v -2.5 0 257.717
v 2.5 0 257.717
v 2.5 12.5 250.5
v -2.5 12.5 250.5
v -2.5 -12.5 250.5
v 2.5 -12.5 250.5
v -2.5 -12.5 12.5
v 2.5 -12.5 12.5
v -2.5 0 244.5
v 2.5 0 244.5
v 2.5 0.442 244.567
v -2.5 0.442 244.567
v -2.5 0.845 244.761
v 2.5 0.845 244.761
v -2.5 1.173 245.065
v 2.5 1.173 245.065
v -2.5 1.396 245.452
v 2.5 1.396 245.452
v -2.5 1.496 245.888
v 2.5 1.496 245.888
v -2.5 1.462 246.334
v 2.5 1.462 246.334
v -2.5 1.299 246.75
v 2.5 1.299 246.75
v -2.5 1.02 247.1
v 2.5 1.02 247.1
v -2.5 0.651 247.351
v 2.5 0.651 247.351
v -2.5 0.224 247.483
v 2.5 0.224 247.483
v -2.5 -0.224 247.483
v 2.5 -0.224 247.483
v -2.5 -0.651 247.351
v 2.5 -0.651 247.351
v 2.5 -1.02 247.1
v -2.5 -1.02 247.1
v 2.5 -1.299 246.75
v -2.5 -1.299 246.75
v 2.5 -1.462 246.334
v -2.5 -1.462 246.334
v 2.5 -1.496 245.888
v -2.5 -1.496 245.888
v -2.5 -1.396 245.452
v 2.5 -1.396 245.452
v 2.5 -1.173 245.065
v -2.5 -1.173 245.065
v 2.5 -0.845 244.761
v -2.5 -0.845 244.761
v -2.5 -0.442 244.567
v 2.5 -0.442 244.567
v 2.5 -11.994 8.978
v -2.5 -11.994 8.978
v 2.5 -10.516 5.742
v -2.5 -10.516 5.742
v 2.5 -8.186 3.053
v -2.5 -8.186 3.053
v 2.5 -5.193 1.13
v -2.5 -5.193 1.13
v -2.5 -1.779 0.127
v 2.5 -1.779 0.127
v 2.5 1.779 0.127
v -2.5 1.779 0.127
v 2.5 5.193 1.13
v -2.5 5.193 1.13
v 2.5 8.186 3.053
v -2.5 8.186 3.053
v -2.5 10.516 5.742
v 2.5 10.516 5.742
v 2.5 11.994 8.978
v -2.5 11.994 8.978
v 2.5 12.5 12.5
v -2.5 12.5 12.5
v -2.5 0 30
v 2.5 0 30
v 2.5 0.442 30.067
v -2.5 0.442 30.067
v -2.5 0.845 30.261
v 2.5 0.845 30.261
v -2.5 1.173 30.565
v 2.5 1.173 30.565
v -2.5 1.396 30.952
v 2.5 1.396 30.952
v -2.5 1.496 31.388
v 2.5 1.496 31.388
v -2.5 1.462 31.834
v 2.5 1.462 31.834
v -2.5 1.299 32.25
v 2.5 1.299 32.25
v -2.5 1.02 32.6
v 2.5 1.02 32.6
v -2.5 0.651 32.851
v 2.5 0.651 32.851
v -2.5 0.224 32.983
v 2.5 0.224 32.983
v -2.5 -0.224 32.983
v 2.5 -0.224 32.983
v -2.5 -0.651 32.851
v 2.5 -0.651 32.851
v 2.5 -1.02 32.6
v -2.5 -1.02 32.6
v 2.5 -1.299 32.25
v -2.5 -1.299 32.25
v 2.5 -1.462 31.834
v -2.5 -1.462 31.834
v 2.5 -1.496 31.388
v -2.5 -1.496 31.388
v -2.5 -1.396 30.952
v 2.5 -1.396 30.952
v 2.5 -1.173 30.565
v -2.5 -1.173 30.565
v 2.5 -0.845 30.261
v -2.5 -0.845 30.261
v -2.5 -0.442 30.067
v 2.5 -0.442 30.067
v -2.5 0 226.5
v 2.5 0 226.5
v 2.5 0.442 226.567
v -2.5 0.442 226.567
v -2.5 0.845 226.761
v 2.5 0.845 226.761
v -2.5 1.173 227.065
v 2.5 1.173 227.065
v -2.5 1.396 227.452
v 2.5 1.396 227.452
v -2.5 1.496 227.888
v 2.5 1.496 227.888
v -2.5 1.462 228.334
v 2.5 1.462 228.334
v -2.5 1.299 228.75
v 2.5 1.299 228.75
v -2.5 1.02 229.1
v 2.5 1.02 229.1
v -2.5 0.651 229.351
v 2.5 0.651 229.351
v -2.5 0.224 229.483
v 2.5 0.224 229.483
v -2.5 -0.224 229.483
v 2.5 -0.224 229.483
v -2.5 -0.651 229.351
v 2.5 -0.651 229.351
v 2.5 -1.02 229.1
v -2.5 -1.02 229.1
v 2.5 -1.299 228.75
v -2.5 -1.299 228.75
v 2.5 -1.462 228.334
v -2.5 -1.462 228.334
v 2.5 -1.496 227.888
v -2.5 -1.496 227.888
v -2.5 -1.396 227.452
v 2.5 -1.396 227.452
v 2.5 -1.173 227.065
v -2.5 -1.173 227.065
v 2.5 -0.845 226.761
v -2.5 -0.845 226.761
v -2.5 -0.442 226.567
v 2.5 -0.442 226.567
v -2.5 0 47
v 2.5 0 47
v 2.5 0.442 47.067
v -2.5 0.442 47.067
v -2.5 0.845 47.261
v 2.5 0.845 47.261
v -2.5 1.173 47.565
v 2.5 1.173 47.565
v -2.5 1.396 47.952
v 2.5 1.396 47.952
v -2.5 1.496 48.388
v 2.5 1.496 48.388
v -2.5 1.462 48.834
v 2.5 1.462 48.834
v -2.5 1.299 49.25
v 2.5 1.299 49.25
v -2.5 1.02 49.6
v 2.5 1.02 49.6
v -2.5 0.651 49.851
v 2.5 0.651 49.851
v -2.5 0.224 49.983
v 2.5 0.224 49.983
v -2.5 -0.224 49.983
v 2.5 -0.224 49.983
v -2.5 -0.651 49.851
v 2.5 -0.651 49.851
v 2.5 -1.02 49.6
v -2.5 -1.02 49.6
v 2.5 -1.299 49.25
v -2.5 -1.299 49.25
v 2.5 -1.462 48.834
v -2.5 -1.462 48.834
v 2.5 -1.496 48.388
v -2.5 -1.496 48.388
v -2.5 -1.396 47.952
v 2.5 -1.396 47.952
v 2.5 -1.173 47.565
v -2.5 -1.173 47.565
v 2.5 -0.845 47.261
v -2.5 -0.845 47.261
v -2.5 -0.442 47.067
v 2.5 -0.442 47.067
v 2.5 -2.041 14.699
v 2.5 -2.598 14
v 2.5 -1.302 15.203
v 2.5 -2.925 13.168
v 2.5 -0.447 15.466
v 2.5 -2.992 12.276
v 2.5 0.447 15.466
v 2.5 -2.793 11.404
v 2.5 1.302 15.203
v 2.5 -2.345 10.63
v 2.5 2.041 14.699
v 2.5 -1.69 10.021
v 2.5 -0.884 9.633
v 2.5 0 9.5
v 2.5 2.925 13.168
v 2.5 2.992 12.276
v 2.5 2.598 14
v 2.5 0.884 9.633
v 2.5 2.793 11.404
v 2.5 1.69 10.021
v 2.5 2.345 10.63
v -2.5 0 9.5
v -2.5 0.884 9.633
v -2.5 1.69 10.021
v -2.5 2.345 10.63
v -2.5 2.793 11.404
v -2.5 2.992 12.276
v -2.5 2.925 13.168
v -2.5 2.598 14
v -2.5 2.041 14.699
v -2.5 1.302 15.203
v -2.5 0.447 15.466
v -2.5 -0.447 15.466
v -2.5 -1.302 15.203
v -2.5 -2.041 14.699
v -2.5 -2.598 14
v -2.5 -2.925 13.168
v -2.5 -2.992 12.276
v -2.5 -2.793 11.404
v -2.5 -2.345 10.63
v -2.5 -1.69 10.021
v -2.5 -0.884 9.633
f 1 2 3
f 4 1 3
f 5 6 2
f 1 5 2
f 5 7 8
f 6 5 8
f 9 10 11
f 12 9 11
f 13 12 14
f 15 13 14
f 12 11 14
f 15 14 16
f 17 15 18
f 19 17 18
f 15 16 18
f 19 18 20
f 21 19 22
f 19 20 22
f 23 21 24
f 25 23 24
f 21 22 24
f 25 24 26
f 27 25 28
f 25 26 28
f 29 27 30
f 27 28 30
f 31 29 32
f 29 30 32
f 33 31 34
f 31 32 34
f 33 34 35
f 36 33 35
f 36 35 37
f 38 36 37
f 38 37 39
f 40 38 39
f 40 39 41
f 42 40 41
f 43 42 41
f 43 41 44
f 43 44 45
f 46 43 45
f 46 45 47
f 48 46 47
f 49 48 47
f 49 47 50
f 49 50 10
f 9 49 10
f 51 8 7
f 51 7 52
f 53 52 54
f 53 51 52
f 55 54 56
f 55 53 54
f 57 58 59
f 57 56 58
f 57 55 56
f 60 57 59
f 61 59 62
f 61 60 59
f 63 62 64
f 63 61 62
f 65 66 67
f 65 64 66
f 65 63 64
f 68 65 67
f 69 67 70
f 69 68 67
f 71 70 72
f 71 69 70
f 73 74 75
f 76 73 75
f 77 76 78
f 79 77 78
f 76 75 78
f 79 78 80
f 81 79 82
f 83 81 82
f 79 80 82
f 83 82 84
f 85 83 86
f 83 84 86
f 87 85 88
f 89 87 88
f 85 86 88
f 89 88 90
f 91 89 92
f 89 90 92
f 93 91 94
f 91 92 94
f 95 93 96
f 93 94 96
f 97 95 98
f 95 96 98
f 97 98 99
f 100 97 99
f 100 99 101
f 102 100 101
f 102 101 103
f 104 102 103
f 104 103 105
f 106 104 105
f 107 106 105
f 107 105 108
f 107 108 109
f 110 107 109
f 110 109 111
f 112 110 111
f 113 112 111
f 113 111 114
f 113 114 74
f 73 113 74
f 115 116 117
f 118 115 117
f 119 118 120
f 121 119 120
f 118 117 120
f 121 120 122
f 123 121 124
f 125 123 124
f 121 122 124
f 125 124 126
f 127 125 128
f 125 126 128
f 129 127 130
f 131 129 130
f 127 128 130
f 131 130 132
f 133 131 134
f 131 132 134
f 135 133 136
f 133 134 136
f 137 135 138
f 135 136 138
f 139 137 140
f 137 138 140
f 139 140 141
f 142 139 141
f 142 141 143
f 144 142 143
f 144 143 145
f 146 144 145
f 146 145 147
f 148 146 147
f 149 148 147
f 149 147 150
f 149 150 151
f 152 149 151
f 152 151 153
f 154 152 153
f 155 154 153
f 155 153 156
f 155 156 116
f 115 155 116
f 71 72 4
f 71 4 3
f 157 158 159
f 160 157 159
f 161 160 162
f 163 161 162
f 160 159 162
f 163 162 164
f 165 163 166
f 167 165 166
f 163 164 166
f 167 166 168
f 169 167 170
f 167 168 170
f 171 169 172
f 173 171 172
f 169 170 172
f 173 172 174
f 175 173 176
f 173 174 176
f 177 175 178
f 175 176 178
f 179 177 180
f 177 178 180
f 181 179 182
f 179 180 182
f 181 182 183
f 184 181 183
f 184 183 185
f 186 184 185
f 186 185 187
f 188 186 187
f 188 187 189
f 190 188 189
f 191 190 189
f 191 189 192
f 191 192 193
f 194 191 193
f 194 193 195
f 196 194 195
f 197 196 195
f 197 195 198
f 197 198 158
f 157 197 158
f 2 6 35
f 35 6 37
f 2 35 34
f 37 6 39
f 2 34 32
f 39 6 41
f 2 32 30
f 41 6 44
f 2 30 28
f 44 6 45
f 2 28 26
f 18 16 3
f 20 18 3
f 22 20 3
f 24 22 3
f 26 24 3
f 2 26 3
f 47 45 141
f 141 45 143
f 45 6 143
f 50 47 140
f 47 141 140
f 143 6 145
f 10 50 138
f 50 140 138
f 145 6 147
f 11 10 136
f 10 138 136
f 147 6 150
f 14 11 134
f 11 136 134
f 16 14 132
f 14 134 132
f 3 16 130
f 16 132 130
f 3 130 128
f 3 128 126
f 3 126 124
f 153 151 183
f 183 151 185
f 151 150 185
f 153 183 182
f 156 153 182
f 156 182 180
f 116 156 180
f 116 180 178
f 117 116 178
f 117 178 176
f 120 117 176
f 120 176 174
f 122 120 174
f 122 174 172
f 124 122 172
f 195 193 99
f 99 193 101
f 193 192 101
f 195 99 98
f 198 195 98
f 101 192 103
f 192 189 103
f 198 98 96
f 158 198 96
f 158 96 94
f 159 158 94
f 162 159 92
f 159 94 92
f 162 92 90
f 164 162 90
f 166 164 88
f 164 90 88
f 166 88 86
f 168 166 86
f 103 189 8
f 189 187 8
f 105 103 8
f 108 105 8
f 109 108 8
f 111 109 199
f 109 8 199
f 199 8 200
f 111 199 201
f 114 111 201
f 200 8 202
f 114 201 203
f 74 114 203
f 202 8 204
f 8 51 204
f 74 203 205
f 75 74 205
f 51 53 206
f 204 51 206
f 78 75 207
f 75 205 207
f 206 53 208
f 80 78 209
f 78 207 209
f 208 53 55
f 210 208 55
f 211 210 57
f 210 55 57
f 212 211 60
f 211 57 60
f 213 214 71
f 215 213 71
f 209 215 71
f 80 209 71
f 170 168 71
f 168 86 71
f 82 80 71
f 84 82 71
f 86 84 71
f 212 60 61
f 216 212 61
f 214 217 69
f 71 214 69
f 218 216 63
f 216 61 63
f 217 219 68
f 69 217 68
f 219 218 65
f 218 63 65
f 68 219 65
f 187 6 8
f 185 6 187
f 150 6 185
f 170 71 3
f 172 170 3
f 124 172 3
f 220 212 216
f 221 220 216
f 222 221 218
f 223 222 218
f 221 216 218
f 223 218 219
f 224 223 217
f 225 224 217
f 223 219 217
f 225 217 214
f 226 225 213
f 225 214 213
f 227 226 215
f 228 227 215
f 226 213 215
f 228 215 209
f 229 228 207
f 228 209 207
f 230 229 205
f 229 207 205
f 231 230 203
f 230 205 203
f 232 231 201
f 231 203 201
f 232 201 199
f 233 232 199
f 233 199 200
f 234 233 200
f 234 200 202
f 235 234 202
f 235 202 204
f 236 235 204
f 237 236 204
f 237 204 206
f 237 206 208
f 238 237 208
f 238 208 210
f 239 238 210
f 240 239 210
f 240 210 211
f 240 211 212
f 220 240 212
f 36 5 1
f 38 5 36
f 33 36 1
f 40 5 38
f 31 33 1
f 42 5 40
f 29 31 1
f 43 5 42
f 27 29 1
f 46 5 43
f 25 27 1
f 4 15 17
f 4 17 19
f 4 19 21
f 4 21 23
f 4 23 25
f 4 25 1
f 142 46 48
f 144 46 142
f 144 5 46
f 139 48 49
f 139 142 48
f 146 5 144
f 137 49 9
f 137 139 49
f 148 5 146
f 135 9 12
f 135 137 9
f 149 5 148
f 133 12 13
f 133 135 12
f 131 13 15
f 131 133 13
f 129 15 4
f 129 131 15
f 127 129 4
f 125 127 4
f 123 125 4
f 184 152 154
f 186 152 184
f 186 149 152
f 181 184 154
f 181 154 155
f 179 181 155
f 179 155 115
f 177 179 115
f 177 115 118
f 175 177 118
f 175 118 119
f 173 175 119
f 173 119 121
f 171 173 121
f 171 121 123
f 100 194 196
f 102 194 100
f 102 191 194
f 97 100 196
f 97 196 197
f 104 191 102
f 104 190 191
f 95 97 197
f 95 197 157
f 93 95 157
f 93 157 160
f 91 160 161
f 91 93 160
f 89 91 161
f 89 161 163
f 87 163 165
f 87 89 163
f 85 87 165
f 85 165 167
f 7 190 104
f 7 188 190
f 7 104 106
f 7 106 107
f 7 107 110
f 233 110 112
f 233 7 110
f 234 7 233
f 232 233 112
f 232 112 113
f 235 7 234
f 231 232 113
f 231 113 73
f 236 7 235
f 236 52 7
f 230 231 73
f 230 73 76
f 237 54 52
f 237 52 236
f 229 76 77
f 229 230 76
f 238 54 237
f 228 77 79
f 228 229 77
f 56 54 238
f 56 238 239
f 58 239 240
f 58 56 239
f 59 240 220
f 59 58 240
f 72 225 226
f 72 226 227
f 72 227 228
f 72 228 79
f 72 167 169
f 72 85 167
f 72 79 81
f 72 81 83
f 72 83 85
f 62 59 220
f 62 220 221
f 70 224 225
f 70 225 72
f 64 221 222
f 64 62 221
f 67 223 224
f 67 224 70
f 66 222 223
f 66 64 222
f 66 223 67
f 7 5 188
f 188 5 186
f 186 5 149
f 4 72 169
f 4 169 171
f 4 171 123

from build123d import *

# Parameters (mm, degrees)
SKETCH1_W           = 5
SKETCH1_H           = 25
BOSS_EXTRUDE1_DEPTH = 258.5
SKETCH2_R           = 3
SKETCH2_R_2         = 1.5
CUT_EXTRUDE1_DEPTH  = 259.850342862


with BuildPart() as part:
    # Sketch1 → Boss-Extrude1 (new body)
    with BuildSketch(Plane.XY):
        Rectangle(SKETCH1_W, SKETCH1_H)
    extrude(amount=BOSS_EXTRUDE1_DEPTH)

    # Sketch2 → Cut-Extrude1 (cut, through all)
    with BuildSketch(Plane(origin=(2.5, 0, 0), x_dir=(0, 0, -1), z_dir=(1, 0, 0))):
        with Locations((-12.5, 0)):
            Circle(SKETCH2_R)
        with Locations((-246, 0)):
            Circle(SKETCH2_R_2)
        with Locations((-228, 0)):
            Circle(SKETCH2_R_2)
        with Locations((-48.5, 0)):
            Circle(SKETCH2_R_2)
        with Locations((-31.5, 0)):
            Circle(SKETCH2_R_2)
        with BuildLine():
            Line((-12.5, 12.5), (5.5, 12.5))
            Line((5.5, 12.5), (5.5, -12.5))
            Line((5.5, -12.5), (-12.5, -12.5))
            ThreePointArc((-12.5, -12.5), (0, 0), (-12.5, 12.5))
        make_face()
        Polygon((-257.716878365, 0), (-250.5, 12.5), (-258.5, 12.5), (-258.5, -12.5), (-250.5, -12.5), align=None)
    extrude(amount=-CUT_EXTRUDE1_DEPTH, mode=Mode.SUBTRACT)


solid = part.part
